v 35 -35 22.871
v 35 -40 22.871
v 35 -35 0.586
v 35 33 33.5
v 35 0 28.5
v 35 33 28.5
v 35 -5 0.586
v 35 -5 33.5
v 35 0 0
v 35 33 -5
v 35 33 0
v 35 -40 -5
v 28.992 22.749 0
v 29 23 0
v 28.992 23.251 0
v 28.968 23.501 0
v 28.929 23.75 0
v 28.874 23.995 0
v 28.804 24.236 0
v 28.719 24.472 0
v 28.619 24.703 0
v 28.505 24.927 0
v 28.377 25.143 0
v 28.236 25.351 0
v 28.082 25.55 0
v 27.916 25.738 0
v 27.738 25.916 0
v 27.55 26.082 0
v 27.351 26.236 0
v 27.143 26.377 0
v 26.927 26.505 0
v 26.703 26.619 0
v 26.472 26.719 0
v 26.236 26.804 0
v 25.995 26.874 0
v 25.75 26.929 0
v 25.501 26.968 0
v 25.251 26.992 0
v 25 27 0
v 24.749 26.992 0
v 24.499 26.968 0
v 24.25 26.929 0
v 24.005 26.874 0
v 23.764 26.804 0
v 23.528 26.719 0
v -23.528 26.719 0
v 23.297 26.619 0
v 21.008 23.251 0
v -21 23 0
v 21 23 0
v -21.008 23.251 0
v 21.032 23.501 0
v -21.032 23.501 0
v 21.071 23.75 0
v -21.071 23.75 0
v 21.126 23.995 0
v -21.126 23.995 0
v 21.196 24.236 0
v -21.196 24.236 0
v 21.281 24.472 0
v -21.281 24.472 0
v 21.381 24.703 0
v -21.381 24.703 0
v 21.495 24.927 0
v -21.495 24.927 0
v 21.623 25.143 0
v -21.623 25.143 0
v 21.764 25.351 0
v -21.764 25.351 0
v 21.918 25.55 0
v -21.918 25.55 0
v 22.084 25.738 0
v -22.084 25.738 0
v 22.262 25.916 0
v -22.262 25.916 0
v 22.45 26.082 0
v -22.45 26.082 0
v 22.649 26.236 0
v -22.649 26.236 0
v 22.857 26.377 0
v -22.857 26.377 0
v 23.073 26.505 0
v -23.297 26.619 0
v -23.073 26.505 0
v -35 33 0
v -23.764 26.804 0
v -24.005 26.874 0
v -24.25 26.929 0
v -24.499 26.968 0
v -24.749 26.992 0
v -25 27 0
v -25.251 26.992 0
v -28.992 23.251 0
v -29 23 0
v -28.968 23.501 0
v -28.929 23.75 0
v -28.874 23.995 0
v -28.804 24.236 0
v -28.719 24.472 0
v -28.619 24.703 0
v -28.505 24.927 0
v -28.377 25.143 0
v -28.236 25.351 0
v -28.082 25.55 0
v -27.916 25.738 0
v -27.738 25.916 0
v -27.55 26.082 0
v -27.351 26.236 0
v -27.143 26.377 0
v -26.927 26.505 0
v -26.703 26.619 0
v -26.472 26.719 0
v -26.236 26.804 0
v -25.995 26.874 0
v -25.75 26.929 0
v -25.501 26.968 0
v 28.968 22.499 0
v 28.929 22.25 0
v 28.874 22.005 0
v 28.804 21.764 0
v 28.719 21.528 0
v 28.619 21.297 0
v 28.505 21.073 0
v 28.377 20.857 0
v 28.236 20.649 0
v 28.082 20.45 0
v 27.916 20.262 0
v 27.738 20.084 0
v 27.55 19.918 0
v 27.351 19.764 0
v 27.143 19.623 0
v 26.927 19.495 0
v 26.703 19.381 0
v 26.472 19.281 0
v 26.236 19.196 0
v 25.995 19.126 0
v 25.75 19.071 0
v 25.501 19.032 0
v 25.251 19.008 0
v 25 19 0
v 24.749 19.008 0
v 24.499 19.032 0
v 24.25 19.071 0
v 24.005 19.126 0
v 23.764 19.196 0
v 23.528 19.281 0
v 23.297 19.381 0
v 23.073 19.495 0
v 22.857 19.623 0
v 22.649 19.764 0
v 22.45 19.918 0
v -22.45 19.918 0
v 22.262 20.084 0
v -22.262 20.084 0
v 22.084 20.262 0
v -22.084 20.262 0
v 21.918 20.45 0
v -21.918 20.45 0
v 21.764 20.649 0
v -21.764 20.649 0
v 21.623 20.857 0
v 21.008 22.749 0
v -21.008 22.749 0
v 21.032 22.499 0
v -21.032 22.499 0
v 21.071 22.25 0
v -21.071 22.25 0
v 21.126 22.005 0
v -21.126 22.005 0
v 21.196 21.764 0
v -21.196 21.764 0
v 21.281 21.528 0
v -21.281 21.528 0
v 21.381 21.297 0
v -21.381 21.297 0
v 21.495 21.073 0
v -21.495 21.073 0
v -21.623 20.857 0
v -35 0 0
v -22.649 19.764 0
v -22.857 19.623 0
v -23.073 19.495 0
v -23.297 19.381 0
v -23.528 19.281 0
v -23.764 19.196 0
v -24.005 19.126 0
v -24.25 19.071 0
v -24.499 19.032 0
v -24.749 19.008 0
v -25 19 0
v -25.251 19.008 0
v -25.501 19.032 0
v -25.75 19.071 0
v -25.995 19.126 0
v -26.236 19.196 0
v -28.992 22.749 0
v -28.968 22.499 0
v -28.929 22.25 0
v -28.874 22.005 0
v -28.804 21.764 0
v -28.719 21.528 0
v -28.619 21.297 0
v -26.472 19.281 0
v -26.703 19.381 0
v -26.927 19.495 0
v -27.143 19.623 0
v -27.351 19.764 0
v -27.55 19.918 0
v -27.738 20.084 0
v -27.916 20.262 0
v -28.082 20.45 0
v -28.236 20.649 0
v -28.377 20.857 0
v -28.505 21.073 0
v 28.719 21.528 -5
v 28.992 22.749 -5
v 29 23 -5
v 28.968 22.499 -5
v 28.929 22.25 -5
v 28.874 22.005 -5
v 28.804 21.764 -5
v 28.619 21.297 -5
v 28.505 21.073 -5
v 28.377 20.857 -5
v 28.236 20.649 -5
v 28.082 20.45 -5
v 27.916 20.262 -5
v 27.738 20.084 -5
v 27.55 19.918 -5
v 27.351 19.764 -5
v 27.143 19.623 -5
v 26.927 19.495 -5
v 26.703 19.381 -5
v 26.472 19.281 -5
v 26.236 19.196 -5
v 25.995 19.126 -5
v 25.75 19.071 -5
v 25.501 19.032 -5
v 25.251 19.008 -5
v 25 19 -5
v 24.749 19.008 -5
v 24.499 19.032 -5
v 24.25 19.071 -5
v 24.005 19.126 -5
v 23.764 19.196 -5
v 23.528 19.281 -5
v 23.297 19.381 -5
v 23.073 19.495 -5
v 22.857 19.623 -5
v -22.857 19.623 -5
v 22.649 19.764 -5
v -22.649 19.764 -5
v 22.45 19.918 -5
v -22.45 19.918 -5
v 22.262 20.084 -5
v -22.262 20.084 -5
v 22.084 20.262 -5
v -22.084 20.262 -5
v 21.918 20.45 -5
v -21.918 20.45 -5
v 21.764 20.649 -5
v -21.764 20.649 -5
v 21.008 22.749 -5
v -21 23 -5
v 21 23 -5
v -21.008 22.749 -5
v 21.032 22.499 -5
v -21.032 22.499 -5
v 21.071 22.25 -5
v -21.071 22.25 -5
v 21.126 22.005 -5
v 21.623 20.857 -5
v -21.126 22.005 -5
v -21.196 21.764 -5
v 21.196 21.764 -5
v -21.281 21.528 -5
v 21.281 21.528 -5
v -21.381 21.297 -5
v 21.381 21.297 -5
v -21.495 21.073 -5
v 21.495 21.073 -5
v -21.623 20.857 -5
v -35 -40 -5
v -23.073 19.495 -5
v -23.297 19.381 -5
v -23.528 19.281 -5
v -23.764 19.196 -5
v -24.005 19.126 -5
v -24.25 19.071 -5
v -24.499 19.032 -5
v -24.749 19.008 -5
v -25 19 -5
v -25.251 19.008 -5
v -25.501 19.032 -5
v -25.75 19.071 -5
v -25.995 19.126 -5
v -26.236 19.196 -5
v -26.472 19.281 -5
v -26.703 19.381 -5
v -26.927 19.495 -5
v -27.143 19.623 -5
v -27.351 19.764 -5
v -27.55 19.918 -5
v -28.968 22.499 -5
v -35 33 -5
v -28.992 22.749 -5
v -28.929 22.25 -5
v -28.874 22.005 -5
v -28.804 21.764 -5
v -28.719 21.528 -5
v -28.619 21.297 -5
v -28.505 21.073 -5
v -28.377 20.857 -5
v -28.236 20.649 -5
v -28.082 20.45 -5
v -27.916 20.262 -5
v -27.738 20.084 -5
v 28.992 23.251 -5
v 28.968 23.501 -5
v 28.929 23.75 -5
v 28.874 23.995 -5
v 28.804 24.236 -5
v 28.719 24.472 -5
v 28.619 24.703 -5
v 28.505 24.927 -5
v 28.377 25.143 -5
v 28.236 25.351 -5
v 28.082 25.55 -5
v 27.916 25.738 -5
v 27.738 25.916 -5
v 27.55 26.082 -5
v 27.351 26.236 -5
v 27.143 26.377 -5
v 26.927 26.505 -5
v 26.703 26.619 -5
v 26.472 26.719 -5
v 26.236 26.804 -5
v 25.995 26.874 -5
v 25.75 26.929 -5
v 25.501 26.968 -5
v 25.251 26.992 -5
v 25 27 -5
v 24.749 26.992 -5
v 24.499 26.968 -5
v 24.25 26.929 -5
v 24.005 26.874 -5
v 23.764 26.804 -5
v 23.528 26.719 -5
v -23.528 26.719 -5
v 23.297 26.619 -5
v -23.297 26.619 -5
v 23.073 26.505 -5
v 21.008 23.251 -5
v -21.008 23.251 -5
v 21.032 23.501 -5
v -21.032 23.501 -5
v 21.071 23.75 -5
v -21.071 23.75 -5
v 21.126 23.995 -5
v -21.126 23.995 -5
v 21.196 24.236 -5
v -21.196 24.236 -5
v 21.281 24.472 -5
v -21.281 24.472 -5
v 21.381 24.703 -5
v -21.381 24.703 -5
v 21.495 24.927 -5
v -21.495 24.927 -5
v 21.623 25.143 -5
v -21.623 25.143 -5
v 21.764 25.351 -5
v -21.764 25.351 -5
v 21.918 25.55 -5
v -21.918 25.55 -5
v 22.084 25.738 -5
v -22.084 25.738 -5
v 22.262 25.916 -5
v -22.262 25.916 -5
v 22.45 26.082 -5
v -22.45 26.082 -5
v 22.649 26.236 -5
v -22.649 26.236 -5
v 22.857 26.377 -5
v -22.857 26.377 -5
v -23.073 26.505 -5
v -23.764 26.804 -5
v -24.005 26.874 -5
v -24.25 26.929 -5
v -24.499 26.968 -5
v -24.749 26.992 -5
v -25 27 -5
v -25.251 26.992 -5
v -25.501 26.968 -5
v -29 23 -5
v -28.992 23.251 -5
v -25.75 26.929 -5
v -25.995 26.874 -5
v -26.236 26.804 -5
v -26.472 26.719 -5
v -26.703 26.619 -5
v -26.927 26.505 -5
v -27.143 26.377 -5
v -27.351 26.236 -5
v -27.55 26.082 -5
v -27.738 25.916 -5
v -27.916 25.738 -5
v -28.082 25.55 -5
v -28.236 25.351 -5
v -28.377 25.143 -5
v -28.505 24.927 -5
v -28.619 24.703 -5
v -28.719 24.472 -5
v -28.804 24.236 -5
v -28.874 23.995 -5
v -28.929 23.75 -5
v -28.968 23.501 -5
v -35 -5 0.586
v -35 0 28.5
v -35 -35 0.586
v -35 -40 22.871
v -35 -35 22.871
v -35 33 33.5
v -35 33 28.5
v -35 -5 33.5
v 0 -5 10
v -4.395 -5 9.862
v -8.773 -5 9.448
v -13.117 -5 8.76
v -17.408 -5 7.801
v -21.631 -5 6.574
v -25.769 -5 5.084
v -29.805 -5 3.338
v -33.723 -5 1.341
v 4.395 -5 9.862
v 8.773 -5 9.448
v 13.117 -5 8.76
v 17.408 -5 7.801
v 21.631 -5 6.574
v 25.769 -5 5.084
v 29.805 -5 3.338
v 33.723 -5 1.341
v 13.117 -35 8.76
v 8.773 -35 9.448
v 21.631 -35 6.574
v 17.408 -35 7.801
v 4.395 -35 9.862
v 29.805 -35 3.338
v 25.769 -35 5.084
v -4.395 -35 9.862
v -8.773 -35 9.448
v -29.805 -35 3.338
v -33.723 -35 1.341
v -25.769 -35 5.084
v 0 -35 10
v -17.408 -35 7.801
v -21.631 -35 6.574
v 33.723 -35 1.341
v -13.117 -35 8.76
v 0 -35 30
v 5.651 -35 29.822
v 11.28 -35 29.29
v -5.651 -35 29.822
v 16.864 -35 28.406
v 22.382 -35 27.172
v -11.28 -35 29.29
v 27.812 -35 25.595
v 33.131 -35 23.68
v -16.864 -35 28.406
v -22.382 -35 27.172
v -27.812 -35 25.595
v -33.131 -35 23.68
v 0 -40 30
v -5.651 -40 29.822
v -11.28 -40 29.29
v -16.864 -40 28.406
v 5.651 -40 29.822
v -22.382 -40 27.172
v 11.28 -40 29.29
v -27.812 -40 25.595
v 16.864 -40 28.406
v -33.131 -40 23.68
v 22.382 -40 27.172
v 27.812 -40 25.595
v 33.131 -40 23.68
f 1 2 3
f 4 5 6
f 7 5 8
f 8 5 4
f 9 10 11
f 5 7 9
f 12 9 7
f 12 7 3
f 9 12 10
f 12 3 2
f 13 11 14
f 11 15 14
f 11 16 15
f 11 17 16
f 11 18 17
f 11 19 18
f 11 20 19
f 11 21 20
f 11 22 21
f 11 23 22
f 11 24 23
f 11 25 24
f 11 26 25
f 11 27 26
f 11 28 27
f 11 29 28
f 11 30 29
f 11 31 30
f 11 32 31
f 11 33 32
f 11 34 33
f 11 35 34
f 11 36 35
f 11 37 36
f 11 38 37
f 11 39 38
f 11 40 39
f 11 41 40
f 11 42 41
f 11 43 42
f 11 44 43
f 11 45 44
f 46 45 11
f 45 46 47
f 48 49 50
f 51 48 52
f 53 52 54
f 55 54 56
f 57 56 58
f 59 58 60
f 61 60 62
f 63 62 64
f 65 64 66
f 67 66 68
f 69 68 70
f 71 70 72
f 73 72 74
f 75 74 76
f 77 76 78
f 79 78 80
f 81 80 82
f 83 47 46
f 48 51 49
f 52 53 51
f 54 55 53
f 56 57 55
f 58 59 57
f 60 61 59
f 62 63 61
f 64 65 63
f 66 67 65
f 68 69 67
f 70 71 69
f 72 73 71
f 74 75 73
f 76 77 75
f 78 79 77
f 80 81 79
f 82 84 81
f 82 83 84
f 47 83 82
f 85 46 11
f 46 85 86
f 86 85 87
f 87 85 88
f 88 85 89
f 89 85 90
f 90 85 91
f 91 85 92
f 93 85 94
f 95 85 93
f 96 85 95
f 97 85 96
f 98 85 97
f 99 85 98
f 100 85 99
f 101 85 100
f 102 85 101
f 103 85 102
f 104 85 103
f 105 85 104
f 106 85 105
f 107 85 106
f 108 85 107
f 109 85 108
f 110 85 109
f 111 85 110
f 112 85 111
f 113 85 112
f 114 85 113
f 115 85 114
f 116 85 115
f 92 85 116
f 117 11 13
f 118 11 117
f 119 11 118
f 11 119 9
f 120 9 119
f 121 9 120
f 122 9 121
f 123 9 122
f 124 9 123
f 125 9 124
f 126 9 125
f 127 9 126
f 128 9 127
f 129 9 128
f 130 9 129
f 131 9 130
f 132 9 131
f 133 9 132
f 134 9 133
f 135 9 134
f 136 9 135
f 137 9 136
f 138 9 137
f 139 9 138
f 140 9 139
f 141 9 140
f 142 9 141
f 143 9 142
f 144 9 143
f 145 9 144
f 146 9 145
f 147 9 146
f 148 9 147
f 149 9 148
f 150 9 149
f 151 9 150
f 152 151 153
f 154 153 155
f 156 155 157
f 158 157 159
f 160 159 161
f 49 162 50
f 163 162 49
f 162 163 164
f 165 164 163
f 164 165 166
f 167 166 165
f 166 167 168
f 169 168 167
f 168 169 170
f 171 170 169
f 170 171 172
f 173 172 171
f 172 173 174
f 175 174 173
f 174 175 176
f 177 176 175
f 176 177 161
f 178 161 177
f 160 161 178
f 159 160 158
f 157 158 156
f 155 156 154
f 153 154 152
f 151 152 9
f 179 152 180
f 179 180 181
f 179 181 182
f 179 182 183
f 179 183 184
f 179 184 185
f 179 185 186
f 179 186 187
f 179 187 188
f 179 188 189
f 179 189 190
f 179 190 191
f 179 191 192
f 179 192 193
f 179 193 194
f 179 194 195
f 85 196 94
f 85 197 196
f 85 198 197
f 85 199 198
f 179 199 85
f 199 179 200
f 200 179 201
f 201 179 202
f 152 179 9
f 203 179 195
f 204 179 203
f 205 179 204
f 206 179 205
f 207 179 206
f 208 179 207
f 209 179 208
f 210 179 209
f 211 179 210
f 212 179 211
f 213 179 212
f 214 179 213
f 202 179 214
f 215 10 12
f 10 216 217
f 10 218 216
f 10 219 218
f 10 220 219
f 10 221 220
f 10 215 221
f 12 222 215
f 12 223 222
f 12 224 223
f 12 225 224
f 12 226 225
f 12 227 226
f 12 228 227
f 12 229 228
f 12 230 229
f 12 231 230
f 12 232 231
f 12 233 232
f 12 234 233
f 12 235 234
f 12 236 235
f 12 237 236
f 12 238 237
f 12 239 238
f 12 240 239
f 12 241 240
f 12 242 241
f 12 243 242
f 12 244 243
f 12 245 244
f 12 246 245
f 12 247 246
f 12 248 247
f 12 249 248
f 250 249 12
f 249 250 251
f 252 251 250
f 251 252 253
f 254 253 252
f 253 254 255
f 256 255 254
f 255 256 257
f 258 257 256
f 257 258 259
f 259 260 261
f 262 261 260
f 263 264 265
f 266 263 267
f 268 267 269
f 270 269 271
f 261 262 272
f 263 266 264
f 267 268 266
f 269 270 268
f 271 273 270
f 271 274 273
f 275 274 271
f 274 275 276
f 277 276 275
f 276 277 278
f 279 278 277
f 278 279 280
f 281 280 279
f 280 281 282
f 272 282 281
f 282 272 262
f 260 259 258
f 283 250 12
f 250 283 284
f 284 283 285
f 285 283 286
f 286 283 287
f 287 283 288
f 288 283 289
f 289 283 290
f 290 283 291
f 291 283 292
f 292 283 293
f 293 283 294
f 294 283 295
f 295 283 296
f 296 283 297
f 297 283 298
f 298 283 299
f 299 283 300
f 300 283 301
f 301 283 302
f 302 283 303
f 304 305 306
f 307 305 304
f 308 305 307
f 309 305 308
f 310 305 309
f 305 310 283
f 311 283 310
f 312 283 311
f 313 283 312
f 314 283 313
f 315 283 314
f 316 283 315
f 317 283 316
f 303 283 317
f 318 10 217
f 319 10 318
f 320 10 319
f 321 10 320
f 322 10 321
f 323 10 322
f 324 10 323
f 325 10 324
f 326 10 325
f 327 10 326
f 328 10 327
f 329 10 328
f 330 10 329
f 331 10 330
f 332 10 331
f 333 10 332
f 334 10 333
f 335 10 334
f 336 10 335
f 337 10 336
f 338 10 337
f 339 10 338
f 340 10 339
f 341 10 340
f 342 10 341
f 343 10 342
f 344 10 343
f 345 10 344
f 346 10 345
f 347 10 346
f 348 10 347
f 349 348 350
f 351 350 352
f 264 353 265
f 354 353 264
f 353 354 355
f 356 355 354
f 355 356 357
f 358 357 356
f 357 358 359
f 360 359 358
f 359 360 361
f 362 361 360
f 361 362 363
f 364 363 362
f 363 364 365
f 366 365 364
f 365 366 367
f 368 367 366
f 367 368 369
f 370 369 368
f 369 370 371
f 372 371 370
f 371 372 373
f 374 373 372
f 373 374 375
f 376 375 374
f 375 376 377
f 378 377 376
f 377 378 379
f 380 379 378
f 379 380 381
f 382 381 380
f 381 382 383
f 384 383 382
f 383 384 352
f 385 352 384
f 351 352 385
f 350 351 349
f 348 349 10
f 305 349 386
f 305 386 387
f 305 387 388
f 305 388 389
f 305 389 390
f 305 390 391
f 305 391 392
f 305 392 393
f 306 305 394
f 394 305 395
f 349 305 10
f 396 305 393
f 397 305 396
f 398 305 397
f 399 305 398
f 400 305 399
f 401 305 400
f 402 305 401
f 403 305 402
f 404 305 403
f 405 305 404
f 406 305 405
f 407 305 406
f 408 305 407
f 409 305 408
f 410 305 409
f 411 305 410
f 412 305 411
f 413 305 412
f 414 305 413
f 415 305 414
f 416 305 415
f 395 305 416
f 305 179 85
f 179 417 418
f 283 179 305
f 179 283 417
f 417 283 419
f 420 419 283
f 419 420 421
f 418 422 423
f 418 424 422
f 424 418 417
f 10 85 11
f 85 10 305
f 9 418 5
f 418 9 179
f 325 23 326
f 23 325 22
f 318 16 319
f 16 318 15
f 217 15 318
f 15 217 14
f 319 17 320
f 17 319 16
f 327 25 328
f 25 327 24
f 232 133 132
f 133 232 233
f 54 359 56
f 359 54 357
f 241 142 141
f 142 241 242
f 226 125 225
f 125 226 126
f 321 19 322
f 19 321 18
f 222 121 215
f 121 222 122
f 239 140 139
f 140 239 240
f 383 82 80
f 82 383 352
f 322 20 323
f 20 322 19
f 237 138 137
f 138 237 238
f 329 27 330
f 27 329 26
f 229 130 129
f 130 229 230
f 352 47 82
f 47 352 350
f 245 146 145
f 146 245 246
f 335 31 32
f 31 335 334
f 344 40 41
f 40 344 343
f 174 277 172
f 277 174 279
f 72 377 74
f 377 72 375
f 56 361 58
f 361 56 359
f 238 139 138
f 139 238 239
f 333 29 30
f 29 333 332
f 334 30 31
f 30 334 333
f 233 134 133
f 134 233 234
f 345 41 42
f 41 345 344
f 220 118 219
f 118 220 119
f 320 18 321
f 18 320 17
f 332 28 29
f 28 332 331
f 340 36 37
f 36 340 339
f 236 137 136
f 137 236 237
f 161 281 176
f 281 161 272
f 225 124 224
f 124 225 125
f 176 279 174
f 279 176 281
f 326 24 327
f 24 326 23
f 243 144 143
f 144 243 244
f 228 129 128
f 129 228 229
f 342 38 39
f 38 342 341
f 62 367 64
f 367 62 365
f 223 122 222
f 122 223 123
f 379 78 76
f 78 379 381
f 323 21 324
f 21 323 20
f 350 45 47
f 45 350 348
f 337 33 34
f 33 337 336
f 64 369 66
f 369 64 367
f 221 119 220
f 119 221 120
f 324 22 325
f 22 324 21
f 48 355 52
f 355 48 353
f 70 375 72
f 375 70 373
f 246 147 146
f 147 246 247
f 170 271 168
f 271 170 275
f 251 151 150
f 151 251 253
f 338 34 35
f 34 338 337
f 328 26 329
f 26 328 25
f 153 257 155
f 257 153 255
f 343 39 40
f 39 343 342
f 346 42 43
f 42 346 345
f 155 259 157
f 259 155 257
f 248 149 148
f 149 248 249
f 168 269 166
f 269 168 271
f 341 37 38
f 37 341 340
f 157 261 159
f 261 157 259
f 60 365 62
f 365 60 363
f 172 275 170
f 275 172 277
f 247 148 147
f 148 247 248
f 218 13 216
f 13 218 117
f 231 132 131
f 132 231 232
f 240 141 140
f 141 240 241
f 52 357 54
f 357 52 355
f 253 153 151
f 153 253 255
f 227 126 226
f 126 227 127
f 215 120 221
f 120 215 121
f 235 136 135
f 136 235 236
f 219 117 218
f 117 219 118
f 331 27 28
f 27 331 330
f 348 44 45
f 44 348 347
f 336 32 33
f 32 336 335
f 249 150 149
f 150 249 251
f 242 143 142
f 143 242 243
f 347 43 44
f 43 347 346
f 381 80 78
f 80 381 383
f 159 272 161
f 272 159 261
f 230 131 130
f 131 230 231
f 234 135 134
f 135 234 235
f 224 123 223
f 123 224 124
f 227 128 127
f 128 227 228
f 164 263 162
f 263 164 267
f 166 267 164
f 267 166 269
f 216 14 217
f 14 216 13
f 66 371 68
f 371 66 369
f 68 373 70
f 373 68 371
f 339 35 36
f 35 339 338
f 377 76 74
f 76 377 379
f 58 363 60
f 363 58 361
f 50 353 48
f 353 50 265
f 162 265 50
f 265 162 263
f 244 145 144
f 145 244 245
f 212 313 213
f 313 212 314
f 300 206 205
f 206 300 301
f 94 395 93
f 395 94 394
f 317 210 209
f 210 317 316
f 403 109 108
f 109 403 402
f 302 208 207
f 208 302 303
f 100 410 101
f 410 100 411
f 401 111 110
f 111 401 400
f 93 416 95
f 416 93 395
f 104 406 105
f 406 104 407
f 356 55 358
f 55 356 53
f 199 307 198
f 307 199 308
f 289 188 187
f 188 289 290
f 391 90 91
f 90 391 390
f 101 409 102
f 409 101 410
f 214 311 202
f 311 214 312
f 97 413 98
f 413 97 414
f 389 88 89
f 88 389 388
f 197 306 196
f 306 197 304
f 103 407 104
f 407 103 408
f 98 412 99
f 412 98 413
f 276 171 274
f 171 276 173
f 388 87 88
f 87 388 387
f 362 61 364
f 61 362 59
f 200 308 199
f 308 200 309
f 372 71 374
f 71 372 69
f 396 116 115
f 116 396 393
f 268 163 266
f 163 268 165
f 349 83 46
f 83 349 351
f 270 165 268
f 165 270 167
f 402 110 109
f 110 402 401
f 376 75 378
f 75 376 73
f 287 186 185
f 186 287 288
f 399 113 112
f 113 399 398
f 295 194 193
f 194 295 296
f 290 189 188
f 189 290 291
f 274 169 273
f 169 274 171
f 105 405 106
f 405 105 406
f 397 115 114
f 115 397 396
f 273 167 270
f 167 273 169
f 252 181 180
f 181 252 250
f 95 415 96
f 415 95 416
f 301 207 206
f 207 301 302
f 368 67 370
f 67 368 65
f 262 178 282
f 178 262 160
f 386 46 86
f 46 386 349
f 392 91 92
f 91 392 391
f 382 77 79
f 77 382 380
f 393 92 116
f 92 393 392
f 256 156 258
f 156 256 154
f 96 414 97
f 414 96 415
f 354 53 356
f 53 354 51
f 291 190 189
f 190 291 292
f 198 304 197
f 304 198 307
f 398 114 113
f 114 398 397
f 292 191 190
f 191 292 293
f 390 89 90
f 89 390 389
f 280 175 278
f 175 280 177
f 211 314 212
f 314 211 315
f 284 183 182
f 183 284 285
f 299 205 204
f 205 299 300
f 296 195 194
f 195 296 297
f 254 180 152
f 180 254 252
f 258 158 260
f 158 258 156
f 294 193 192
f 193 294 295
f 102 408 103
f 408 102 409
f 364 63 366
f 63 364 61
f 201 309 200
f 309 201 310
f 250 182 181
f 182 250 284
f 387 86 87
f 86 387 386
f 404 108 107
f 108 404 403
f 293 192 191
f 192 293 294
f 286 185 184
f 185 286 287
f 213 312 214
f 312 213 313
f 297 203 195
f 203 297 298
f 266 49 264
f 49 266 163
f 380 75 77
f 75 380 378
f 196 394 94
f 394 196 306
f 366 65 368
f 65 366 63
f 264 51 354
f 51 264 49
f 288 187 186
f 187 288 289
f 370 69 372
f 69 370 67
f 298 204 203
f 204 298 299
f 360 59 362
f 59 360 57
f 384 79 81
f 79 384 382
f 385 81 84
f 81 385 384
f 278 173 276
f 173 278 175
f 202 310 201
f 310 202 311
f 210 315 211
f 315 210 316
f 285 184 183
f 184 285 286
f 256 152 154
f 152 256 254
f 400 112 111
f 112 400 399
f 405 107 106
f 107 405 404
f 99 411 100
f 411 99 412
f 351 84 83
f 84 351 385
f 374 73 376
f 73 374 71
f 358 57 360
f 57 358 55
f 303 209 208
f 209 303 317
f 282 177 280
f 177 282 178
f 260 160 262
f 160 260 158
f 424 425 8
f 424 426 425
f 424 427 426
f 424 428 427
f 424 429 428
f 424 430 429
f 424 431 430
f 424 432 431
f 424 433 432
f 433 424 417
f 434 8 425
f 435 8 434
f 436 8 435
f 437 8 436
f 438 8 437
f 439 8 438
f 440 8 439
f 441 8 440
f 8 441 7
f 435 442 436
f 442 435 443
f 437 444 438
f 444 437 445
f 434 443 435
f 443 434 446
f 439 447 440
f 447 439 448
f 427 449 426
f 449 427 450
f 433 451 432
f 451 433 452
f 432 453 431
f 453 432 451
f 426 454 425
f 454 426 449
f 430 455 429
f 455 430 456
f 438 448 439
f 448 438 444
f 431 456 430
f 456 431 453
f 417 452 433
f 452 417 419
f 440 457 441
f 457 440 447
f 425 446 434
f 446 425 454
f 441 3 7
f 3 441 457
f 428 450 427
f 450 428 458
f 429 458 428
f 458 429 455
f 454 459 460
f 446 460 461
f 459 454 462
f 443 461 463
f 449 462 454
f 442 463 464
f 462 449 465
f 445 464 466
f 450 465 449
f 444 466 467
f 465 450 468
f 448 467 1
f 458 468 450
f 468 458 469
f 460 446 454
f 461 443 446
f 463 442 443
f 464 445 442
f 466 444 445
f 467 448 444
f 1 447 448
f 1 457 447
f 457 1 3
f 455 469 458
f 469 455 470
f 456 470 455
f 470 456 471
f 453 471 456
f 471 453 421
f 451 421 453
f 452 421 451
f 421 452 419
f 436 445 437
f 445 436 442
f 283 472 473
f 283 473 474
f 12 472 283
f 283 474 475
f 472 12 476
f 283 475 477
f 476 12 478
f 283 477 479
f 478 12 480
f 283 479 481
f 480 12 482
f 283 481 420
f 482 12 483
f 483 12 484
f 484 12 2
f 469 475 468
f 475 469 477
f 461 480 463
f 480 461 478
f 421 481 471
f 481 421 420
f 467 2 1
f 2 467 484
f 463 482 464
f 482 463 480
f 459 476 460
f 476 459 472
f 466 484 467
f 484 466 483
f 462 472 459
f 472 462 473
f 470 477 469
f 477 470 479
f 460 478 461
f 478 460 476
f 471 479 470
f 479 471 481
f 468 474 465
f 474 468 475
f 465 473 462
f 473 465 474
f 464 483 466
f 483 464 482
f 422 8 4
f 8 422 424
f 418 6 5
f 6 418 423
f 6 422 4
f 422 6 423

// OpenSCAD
// Hook
width = 70;
height = 28.5;
depth = 33;
size = 5;

// Holes
spacing = 50;
position = 23;
hole = 4;

// Headphones
head_width = 35;

$fn = 100;

module base() {
     translate ([- width/2, 0, 0]) cube([width, depth, size]);
}

module bottom() {
     module hole() {
          translate([0, 0, -height]) difference() {
               translate([spacing/2, position, -1]) cylinder(height+2, hole, hole);
          }
     }
     difference() {
          translate([0, 0, -size]) base();
          hole();
          mirror([1,0,0]) hole();
     }
}

module front() {
     translate([-width/2, -size, -size]) cube([width, size, height + 2 * size]);
}

module top() {
     translate([0, 0, height]) base();
}

module support() {
     intersection() {
          translate([-width/2, -head_width - size, -size]) cube([width, head_width, height + 2 * size]);
          translate([0, 0, -60]) rotate([90, 0, 0]) cylinder(head_width, 70, 70);
     }
}

module head_front() {
     intersection() {
          translate([-width/2, -head_width - size, -size]) cube([width, size, height + 2 * size]);
          translate([0, -head_width, -60]) rotate([90, 0, 0]) cylinder(size, 90, 90);
     }
}

union() {
     bottom();
     front();
     top();
     support();
     head_front();
}
